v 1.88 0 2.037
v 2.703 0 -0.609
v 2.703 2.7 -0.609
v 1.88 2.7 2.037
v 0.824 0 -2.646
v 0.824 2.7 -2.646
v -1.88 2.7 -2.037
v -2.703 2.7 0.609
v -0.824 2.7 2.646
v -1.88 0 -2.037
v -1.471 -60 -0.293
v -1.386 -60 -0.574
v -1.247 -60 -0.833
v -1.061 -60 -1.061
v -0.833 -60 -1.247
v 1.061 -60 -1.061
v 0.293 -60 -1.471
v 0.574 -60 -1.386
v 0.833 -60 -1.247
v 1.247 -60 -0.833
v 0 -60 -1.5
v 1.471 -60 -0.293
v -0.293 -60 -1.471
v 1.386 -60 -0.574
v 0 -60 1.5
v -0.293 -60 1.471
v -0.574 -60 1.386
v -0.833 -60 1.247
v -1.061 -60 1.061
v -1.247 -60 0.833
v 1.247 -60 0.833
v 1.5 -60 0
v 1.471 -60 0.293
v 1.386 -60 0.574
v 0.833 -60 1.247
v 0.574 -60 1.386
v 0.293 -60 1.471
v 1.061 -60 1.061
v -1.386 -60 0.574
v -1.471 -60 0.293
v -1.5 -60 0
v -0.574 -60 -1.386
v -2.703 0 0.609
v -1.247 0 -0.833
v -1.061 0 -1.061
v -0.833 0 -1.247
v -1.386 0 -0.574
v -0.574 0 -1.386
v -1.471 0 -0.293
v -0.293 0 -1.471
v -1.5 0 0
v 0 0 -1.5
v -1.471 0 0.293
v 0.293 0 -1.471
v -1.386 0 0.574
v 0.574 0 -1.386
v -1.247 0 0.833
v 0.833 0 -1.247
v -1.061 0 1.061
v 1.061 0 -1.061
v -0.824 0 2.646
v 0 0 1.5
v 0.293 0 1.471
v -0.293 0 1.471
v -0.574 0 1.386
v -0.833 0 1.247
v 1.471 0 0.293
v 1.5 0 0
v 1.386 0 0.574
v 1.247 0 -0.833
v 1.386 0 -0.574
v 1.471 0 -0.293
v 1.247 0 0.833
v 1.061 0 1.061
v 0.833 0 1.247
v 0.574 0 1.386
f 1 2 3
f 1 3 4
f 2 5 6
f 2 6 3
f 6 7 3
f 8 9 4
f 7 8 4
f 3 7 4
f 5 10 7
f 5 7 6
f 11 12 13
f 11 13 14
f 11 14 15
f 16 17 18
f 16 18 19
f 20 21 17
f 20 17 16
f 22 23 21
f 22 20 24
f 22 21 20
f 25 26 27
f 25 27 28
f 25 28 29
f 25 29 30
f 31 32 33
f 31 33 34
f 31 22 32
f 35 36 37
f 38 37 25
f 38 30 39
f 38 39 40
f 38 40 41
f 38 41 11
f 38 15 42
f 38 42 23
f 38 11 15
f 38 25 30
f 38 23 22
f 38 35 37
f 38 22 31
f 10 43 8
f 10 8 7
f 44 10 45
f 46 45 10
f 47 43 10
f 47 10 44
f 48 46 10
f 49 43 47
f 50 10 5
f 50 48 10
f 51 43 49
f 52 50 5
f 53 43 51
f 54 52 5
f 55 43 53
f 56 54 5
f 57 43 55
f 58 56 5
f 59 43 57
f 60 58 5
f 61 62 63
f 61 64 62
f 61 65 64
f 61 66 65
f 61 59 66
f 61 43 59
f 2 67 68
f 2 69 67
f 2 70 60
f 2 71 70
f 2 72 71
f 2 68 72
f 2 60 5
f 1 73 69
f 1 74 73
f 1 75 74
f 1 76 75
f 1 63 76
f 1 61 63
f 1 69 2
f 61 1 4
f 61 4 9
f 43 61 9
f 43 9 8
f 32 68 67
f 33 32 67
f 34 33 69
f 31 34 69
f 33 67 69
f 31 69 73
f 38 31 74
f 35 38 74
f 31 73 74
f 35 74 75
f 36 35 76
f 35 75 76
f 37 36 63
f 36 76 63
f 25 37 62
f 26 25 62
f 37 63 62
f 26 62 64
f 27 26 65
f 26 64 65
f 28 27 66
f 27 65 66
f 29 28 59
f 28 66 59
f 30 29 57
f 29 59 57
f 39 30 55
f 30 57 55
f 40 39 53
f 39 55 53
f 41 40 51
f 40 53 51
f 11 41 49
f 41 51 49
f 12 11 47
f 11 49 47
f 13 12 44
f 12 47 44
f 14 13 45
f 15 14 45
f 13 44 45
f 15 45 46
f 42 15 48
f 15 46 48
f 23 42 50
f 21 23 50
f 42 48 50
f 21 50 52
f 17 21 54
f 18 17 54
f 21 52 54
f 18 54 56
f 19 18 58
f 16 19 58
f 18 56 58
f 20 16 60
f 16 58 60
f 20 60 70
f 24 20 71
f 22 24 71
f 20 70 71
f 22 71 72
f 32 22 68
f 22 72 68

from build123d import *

# Parameters (mm, degrees)
F0_R     = 1.5
F1_DEPTH = 60
F2_DEPTH = 2.7


with BuildPart() as f1:
    # F0 (on Front) → F1 (new body)
    with BuildSketch(Plane.XZ):
        Circle(F0_R)
    extrude(amount=F1_DEPTH)

    # F0 (on Front) → F2 (join)
    with BuildSketch(Plane.XZ):
        Polygon((-0.82392, 2.64597), (-2.703437, 0.609449), (-1.879517, -2.03652), (0.82392, -2.64597), (2.703437, -0.609449), (1.879517, 2.03652), align=None)
        Circle(F0_R, mode=Mode.SUBTRACT)
        Circle(F0_R)
    extrude(amount=-F2_DEPTH)


solid = f1.part
